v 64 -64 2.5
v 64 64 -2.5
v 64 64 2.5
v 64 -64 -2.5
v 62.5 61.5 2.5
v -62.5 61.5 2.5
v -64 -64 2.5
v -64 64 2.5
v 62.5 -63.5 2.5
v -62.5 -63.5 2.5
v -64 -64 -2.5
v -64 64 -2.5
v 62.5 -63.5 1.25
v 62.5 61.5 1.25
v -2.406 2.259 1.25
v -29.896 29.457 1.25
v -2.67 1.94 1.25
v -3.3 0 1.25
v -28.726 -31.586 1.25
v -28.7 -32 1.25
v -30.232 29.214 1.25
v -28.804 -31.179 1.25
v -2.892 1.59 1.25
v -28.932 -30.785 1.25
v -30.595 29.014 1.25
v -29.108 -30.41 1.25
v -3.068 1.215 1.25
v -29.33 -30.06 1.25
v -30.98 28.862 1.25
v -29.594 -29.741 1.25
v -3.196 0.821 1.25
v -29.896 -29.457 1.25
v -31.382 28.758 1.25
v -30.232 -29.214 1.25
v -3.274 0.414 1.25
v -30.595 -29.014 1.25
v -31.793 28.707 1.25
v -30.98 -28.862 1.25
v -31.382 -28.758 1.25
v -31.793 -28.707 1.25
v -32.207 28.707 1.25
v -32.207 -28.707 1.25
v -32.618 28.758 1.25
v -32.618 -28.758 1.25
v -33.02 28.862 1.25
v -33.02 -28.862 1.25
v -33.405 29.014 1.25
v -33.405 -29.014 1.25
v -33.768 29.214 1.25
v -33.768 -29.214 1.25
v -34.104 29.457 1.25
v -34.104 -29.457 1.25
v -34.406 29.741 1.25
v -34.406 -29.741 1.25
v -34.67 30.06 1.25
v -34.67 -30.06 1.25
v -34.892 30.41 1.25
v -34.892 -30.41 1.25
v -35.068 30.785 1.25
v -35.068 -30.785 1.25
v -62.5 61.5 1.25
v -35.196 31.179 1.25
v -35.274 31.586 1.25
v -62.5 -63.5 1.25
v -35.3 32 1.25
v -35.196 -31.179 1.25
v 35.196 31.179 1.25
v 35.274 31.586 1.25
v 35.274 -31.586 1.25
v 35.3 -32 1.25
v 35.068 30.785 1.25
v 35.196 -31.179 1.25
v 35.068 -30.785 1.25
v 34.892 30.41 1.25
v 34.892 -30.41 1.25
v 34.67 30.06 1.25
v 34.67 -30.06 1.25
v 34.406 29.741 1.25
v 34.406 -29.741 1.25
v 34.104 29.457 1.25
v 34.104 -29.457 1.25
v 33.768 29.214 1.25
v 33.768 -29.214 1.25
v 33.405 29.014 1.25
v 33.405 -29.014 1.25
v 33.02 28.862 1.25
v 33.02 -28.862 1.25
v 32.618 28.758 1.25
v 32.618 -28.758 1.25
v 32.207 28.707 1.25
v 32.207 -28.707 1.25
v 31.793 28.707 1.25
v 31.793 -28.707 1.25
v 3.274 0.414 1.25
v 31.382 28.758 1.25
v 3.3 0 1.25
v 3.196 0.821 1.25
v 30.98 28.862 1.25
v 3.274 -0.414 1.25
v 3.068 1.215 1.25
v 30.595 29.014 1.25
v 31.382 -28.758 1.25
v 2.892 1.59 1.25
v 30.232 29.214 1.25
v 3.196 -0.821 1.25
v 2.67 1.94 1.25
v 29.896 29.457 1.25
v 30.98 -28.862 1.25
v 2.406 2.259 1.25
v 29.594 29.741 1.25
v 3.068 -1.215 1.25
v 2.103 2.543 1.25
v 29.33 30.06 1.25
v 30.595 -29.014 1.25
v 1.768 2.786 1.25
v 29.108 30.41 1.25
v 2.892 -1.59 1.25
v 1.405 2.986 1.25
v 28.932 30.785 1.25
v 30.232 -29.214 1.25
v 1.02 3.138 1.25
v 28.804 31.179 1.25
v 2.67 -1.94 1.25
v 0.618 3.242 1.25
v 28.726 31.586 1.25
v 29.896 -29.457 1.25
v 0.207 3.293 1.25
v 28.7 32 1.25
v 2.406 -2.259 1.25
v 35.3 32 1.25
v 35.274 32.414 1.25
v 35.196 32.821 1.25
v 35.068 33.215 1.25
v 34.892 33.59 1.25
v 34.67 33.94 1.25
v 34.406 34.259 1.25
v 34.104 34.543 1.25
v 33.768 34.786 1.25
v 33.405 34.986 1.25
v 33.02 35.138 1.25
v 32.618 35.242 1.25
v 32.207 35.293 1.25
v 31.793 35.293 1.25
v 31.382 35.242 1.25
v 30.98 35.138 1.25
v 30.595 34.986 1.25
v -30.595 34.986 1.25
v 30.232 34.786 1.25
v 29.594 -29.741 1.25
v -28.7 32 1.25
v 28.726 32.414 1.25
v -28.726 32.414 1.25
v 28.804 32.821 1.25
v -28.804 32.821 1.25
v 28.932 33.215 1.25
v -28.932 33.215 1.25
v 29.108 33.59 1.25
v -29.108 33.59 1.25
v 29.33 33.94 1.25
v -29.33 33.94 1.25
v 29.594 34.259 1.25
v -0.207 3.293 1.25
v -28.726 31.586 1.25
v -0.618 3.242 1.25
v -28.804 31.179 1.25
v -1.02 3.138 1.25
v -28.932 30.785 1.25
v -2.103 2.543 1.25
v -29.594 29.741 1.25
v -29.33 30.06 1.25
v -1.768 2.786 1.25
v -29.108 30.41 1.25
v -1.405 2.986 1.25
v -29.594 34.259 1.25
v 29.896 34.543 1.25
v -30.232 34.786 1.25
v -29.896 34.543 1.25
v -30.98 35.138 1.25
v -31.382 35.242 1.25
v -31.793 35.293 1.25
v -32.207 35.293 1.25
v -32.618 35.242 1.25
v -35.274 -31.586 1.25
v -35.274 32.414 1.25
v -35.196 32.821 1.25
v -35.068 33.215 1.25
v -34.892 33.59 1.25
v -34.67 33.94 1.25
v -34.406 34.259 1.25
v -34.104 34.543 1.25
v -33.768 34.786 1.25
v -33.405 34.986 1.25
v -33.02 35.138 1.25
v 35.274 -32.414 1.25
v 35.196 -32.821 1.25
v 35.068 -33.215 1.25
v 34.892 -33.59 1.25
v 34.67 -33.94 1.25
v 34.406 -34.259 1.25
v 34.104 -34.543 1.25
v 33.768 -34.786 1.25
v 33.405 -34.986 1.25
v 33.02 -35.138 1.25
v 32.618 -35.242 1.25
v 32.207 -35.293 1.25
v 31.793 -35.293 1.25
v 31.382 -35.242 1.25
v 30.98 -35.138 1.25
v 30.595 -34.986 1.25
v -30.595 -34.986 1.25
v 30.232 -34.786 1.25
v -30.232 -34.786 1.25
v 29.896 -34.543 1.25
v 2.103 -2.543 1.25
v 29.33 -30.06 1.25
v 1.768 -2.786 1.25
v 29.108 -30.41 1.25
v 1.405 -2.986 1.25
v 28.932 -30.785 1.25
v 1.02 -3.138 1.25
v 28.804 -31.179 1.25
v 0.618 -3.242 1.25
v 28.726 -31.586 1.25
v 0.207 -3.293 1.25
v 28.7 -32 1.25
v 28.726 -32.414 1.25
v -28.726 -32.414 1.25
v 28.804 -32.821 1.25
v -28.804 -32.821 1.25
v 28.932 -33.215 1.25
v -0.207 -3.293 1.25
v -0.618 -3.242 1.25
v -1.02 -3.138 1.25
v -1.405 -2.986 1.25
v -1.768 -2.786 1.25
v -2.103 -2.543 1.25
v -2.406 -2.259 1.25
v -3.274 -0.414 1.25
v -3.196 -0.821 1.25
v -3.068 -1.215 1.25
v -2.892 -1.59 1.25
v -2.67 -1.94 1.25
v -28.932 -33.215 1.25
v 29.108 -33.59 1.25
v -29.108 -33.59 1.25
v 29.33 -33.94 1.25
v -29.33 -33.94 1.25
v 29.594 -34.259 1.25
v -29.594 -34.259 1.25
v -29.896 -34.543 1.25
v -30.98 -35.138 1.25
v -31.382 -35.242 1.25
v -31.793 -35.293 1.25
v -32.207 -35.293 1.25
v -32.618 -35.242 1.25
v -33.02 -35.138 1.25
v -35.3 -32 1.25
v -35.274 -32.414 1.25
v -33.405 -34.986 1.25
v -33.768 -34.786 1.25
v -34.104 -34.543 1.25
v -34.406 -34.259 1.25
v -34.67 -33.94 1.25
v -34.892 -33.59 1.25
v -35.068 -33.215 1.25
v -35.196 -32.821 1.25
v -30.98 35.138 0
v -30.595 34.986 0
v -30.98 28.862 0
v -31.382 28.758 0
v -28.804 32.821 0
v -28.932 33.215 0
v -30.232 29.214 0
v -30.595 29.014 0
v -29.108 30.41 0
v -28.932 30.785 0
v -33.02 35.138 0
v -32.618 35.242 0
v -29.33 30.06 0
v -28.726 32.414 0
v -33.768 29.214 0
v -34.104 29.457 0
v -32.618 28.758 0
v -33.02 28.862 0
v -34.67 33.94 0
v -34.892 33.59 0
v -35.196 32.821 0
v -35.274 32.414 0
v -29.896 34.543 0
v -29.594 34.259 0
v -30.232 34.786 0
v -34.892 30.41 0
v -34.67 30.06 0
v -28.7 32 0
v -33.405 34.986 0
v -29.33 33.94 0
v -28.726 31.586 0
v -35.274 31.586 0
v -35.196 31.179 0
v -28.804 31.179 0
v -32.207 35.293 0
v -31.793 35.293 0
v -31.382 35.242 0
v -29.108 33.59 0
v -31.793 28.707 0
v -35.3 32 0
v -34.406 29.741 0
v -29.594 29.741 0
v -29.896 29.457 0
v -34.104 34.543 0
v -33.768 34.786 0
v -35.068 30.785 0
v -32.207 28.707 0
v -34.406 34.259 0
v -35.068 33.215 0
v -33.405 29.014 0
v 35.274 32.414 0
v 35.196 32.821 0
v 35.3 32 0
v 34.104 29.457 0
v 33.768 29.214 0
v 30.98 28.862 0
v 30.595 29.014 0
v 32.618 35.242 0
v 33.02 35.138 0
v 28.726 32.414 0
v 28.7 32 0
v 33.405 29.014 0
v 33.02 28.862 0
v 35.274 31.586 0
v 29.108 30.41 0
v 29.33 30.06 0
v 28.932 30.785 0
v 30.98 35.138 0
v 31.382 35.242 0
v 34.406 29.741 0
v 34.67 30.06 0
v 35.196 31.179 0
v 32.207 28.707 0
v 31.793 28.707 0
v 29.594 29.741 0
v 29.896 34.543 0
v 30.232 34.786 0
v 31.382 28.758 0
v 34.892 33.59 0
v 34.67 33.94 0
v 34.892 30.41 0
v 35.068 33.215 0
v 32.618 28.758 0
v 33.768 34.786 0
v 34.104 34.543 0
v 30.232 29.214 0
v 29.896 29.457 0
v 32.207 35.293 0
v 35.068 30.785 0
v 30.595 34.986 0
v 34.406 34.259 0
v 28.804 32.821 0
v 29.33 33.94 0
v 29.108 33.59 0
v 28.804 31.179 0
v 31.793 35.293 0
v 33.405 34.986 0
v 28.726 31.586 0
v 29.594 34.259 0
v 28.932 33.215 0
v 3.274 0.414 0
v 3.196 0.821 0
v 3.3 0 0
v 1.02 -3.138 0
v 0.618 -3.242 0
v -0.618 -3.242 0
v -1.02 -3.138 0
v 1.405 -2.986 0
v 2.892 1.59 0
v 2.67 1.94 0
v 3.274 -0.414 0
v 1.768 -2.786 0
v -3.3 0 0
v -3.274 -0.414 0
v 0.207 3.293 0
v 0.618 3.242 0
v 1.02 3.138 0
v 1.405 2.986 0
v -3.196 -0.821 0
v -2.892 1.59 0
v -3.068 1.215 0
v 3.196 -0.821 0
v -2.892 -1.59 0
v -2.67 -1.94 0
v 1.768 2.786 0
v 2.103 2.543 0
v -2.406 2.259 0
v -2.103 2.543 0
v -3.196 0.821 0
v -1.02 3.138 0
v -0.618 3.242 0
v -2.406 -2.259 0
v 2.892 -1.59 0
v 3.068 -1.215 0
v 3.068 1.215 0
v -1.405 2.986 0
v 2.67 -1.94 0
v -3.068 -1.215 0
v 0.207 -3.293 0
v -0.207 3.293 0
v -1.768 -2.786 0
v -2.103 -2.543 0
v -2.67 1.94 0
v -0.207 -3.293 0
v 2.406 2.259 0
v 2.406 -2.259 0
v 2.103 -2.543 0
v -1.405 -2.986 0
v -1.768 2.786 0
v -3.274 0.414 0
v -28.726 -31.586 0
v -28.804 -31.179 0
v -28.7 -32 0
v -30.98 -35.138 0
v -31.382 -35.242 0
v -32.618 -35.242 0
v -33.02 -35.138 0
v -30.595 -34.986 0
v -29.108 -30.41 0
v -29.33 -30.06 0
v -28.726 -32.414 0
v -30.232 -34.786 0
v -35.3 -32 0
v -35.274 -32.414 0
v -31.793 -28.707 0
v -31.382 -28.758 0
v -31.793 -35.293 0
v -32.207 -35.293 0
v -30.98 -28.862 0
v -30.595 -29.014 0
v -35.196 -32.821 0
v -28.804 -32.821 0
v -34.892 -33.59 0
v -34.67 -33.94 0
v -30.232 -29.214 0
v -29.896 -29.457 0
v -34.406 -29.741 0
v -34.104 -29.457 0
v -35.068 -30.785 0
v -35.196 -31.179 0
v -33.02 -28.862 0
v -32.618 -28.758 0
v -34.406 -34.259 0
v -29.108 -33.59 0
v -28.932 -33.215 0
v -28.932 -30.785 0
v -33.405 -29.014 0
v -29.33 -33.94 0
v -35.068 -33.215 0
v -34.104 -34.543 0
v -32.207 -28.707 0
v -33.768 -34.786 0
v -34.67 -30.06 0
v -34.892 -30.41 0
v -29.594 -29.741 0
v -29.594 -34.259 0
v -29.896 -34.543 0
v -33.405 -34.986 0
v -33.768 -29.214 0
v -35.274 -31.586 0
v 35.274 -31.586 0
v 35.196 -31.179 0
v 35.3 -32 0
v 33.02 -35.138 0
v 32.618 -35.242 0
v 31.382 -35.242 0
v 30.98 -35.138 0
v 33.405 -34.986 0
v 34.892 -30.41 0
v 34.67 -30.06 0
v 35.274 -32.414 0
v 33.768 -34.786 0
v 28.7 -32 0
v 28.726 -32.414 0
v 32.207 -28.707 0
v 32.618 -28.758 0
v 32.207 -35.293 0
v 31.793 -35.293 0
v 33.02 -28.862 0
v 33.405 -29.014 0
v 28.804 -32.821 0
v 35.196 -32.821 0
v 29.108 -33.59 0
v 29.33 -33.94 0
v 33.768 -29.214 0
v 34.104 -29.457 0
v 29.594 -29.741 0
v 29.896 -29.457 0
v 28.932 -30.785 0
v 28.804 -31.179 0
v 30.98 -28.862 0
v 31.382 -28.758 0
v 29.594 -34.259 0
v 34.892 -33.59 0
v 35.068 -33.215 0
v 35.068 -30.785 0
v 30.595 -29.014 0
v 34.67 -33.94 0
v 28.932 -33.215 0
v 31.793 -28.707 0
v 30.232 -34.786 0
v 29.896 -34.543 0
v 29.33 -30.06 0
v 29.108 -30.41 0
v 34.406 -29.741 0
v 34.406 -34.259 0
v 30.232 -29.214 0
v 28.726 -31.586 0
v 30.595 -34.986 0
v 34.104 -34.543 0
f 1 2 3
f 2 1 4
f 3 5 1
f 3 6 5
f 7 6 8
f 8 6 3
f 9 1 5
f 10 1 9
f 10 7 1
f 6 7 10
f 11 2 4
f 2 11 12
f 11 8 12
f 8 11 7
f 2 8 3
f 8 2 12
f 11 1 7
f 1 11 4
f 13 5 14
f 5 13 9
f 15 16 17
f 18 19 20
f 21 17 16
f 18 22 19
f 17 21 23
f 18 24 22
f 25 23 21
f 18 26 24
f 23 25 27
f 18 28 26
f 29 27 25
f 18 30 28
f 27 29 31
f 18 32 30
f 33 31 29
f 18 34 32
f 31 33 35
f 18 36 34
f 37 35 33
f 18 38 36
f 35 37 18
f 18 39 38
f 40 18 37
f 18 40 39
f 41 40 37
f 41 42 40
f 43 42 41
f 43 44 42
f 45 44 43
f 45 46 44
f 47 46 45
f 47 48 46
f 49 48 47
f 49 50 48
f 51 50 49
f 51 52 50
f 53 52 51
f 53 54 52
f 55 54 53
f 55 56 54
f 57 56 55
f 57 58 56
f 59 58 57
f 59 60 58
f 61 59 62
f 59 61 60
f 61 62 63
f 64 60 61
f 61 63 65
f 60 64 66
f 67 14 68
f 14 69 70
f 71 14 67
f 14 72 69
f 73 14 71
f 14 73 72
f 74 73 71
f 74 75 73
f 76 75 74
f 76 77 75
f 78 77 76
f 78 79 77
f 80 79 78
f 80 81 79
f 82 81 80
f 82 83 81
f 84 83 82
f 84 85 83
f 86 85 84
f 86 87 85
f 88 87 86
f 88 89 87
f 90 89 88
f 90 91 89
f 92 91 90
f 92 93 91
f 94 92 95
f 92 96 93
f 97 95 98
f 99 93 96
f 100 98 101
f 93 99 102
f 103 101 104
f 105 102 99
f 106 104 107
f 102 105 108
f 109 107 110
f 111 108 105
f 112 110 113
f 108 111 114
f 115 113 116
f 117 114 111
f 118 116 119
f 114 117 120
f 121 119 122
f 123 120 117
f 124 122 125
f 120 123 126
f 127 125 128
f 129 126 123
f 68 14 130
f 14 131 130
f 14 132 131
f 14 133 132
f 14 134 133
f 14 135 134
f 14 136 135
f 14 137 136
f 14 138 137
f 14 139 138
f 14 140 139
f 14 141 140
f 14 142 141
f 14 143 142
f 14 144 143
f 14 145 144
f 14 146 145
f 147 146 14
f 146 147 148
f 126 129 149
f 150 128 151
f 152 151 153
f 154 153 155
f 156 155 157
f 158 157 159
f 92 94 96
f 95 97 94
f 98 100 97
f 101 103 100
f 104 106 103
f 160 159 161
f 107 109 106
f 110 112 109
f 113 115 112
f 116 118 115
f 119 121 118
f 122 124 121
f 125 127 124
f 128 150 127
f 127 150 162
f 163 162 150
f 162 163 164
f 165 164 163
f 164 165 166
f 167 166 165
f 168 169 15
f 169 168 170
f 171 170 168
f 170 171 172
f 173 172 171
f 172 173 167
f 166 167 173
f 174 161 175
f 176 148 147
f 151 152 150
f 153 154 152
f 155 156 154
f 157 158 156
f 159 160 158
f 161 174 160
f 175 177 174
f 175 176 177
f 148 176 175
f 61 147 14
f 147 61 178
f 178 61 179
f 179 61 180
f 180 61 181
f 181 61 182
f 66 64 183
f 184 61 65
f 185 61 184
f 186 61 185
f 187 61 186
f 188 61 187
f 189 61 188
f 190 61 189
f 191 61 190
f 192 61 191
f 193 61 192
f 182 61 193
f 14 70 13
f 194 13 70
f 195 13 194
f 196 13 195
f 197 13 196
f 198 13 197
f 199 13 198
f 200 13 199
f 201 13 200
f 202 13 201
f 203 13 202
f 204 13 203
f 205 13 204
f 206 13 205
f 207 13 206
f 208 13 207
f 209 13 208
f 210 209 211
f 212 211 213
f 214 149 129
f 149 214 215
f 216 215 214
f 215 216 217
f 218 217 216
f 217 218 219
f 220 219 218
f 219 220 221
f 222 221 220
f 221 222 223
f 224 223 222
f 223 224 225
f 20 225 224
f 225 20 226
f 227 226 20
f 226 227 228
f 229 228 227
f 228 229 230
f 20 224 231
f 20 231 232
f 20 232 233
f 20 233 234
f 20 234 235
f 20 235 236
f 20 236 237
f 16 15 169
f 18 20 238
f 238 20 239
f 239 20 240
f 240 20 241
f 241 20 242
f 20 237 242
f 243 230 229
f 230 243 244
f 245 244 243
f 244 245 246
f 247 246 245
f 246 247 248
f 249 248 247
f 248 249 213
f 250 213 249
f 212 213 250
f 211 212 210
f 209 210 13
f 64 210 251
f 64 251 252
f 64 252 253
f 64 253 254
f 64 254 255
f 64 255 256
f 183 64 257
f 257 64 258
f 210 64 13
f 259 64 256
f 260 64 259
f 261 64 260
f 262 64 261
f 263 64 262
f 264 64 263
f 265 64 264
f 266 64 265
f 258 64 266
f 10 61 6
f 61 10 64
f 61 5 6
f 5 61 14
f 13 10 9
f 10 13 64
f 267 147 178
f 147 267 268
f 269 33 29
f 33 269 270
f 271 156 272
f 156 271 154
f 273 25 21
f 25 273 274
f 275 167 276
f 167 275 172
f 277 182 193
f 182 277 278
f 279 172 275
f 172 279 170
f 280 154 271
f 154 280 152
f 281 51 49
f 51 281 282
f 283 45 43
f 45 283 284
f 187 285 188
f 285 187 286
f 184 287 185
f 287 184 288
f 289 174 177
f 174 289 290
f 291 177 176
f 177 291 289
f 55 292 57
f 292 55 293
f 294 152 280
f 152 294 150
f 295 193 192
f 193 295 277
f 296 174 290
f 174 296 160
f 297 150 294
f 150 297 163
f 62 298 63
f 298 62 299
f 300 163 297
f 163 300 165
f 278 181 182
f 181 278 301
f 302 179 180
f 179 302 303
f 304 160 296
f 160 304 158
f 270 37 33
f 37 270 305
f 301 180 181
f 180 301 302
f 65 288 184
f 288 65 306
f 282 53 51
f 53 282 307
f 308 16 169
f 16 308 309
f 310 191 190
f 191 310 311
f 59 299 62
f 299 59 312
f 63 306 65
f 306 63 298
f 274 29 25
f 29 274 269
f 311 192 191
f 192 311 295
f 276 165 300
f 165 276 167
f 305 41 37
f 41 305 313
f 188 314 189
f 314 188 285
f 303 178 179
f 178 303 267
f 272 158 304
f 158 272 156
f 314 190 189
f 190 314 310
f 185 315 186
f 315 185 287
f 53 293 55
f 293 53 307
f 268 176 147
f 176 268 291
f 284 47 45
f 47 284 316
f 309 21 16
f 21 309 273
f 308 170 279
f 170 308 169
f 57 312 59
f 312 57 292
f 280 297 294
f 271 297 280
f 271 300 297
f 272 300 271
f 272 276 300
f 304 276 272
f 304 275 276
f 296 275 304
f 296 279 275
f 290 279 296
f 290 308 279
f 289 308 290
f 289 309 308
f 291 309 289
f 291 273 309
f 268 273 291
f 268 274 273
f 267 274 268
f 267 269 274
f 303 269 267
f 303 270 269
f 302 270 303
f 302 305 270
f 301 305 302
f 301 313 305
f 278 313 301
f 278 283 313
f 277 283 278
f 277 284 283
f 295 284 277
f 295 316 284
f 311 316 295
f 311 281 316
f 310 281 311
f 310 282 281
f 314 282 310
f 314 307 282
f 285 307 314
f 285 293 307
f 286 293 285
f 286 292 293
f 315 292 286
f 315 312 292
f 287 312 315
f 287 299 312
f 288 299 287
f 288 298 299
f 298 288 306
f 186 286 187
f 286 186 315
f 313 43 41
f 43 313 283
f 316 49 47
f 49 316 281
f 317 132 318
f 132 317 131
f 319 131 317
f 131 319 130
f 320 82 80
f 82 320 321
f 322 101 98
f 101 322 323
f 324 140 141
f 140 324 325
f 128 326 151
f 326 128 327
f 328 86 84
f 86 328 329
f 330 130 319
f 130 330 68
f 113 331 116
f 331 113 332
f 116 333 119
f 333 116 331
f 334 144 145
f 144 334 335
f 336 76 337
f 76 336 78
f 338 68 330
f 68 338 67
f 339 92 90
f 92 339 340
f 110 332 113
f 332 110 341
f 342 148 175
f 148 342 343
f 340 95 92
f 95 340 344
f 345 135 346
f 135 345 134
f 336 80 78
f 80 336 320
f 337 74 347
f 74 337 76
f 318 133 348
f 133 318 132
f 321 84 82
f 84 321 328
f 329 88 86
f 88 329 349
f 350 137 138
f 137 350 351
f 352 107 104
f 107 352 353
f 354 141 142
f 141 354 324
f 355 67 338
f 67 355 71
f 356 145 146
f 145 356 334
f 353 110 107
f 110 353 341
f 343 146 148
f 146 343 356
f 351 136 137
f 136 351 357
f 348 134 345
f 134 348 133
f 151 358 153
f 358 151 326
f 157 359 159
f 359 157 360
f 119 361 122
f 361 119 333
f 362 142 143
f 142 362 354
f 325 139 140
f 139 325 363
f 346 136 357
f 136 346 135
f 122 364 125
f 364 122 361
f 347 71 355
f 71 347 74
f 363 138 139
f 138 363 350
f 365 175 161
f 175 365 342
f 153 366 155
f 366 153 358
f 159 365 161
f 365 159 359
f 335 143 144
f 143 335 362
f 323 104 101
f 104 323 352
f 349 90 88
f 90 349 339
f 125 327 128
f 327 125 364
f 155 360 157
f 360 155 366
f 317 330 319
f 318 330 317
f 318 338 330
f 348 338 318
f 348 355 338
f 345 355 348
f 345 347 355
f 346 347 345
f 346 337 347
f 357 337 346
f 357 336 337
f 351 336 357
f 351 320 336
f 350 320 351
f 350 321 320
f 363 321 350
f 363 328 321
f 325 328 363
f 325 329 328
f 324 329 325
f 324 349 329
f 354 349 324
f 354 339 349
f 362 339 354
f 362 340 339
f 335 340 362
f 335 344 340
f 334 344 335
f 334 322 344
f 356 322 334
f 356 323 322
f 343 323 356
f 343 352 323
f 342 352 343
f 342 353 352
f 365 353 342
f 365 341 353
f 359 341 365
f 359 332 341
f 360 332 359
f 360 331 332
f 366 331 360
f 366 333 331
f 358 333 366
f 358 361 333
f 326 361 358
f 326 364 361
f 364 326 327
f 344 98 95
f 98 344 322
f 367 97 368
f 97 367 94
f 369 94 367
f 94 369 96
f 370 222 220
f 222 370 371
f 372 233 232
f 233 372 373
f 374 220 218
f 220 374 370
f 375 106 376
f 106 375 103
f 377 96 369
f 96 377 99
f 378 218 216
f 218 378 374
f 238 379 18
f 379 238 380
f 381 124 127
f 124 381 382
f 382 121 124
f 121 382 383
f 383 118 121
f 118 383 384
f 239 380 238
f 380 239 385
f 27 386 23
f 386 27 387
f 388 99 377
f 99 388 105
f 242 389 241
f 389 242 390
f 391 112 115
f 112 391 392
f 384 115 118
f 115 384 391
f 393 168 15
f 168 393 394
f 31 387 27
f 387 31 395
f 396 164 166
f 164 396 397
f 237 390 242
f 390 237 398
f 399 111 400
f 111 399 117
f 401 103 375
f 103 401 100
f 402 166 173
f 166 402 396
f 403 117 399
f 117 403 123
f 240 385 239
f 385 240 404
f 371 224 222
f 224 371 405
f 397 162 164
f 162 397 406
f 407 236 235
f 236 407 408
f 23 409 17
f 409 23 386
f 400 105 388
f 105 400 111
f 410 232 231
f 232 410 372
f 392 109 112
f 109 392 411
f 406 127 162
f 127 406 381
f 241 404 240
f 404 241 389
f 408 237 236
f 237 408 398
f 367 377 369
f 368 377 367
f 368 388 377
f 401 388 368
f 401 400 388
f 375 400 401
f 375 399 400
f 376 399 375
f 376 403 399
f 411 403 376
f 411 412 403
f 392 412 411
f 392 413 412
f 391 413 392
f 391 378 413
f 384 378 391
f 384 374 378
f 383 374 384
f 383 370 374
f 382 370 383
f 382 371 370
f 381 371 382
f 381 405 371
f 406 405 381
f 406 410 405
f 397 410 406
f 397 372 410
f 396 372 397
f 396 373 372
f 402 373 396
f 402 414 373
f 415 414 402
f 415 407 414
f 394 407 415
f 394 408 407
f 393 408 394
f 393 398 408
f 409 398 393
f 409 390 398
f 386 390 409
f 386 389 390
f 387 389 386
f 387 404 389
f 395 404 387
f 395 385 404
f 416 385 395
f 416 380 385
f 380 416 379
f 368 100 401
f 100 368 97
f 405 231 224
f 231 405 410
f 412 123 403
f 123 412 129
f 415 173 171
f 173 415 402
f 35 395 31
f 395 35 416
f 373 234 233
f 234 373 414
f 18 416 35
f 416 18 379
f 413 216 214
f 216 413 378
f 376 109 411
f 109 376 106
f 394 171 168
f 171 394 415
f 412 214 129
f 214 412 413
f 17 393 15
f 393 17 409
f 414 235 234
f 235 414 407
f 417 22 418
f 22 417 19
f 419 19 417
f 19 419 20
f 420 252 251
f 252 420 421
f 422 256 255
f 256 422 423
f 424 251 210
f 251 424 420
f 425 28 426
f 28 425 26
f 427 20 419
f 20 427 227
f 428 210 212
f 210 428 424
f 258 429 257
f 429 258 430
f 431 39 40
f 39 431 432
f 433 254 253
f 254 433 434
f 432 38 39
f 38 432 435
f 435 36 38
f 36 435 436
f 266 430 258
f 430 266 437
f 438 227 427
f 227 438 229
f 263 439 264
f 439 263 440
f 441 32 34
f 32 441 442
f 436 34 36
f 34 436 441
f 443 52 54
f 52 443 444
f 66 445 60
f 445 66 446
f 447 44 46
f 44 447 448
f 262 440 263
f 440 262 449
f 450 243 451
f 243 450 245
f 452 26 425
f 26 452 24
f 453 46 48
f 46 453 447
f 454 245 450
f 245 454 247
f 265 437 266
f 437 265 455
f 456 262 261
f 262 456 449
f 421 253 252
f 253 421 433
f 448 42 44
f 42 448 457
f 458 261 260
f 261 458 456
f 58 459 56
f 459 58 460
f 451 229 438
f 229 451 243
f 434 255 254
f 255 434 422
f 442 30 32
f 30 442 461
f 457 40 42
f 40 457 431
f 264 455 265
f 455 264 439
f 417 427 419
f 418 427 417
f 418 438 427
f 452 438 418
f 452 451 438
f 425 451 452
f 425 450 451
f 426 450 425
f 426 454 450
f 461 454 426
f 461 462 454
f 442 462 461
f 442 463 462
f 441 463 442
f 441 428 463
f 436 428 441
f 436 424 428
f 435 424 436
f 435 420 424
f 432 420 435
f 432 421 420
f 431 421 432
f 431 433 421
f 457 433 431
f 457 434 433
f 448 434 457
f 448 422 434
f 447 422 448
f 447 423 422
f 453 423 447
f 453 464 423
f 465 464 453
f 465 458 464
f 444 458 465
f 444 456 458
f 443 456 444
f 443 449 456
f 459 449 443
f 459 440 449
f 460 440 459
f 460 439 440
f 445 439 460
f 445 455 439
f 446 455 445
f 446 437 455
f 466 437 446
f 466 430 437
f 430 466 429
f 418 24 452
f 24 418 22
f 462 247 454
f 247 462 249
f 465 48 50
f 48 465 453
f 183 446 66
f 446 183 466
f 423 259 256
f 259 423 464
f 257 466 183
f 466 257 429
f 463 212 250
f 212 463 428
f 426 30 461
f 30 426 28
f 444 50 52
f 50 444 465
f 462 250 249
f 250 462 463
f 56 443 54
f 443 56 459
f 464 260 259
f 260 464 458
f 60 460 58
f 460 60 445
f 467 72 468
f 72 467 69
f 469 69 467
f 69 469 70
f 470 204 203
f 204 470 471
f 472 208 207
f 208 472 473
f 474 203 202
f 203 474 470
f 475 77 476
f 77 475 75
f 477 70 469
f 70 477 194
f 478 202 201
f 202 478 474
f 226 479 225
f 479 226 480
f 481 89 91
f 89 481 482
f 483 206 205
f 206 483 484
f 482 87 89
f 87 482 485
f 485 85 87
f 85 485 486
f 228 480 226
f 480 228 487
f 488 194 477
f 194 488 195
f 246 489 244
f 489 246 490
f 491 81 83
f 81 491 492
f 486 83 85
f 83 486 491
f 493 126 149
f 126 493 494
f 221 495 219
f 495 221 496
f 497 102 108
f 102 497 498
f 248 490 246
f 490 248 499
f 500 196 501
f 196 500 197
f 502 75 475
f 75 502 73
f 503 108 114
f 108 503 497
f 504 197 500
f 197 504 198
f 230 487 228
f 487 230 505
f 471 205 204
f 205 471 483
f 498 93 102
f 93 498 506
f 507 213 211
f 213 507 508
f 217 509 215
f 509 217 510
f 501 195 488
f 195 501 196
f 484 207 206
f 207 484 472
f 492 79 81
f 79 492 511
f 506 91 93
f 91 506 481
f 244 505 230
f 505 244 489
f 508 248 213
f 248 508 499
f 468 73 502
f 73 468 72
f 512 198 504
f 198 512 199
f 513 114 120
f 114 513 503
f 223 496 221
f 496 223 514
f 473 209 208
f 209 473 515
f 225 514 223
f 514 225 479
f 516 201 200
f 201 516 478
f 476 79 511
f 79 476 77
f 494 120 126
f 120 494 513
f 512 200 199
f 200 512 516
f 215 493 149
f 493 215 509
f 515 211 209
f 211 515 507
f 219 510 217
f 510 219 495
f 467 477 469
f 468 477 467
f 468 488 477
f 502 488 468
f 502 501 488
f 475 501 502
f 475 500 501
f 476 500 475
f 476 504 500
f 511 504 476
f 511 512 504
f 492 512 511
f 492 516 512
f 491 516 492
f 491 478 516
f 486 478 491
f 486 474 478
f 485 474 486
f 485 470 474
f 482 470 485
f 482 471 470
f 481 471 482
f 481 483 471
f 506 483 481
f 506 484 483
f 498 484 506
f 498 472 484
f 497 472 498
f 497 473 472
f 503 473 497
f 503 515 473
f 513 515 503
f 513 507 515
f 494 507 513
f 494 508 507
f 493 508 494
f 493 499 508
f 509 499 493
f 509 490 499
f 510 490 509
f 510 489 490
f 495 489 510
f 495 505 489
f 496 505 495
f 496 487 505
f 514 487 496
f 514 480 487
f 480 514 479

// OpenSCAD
inset_x = 125;
inset_y = 125;
inset_z = 4.5;

outer_x = 128;
outer_y = 128;
outer_z = 5;

hole_r = 3.3;
hole_depth = 3;
hole_z = (outer_z / 2) + hole_depth;
$fn=50;

difference() {
    cube([outer_x, outer_y, outer_z], center = true);

    translate([0, -1, 3.5])
    {
        cube([inset_x, inset_y, inset_z], center = true);
    }

    
    /* Top left */
    translate([-(outer_x / 4), (outer_y / 4), 0])
    {
        cylinder(hole_z, hole_r, hole_r, false);
    }
    
    /* Top right */
    translate([(outer_x / 4), (outer_y / 4), 0])
    {
        cylinder(hole_z, hole_r, hole_r, false);
    }
    
    /* Middle */
    translate([0, 0, 0])
    {
        cylinder(hole_z, hole_r, hole_r, false);
    }
    
    /* Bottom left */
    translate([-(outer_x / 4), -(outer_y / 4), 0])
    {
        cylinder(hole_z, hole_r, hole_r, false);
    }
    
    /* Bottom right */
    translate([(outer_x / 4), -(outer_y / 4), 0])
    {
        cylinder(hole_z, hole_r, hole_r, false);
    }
}
